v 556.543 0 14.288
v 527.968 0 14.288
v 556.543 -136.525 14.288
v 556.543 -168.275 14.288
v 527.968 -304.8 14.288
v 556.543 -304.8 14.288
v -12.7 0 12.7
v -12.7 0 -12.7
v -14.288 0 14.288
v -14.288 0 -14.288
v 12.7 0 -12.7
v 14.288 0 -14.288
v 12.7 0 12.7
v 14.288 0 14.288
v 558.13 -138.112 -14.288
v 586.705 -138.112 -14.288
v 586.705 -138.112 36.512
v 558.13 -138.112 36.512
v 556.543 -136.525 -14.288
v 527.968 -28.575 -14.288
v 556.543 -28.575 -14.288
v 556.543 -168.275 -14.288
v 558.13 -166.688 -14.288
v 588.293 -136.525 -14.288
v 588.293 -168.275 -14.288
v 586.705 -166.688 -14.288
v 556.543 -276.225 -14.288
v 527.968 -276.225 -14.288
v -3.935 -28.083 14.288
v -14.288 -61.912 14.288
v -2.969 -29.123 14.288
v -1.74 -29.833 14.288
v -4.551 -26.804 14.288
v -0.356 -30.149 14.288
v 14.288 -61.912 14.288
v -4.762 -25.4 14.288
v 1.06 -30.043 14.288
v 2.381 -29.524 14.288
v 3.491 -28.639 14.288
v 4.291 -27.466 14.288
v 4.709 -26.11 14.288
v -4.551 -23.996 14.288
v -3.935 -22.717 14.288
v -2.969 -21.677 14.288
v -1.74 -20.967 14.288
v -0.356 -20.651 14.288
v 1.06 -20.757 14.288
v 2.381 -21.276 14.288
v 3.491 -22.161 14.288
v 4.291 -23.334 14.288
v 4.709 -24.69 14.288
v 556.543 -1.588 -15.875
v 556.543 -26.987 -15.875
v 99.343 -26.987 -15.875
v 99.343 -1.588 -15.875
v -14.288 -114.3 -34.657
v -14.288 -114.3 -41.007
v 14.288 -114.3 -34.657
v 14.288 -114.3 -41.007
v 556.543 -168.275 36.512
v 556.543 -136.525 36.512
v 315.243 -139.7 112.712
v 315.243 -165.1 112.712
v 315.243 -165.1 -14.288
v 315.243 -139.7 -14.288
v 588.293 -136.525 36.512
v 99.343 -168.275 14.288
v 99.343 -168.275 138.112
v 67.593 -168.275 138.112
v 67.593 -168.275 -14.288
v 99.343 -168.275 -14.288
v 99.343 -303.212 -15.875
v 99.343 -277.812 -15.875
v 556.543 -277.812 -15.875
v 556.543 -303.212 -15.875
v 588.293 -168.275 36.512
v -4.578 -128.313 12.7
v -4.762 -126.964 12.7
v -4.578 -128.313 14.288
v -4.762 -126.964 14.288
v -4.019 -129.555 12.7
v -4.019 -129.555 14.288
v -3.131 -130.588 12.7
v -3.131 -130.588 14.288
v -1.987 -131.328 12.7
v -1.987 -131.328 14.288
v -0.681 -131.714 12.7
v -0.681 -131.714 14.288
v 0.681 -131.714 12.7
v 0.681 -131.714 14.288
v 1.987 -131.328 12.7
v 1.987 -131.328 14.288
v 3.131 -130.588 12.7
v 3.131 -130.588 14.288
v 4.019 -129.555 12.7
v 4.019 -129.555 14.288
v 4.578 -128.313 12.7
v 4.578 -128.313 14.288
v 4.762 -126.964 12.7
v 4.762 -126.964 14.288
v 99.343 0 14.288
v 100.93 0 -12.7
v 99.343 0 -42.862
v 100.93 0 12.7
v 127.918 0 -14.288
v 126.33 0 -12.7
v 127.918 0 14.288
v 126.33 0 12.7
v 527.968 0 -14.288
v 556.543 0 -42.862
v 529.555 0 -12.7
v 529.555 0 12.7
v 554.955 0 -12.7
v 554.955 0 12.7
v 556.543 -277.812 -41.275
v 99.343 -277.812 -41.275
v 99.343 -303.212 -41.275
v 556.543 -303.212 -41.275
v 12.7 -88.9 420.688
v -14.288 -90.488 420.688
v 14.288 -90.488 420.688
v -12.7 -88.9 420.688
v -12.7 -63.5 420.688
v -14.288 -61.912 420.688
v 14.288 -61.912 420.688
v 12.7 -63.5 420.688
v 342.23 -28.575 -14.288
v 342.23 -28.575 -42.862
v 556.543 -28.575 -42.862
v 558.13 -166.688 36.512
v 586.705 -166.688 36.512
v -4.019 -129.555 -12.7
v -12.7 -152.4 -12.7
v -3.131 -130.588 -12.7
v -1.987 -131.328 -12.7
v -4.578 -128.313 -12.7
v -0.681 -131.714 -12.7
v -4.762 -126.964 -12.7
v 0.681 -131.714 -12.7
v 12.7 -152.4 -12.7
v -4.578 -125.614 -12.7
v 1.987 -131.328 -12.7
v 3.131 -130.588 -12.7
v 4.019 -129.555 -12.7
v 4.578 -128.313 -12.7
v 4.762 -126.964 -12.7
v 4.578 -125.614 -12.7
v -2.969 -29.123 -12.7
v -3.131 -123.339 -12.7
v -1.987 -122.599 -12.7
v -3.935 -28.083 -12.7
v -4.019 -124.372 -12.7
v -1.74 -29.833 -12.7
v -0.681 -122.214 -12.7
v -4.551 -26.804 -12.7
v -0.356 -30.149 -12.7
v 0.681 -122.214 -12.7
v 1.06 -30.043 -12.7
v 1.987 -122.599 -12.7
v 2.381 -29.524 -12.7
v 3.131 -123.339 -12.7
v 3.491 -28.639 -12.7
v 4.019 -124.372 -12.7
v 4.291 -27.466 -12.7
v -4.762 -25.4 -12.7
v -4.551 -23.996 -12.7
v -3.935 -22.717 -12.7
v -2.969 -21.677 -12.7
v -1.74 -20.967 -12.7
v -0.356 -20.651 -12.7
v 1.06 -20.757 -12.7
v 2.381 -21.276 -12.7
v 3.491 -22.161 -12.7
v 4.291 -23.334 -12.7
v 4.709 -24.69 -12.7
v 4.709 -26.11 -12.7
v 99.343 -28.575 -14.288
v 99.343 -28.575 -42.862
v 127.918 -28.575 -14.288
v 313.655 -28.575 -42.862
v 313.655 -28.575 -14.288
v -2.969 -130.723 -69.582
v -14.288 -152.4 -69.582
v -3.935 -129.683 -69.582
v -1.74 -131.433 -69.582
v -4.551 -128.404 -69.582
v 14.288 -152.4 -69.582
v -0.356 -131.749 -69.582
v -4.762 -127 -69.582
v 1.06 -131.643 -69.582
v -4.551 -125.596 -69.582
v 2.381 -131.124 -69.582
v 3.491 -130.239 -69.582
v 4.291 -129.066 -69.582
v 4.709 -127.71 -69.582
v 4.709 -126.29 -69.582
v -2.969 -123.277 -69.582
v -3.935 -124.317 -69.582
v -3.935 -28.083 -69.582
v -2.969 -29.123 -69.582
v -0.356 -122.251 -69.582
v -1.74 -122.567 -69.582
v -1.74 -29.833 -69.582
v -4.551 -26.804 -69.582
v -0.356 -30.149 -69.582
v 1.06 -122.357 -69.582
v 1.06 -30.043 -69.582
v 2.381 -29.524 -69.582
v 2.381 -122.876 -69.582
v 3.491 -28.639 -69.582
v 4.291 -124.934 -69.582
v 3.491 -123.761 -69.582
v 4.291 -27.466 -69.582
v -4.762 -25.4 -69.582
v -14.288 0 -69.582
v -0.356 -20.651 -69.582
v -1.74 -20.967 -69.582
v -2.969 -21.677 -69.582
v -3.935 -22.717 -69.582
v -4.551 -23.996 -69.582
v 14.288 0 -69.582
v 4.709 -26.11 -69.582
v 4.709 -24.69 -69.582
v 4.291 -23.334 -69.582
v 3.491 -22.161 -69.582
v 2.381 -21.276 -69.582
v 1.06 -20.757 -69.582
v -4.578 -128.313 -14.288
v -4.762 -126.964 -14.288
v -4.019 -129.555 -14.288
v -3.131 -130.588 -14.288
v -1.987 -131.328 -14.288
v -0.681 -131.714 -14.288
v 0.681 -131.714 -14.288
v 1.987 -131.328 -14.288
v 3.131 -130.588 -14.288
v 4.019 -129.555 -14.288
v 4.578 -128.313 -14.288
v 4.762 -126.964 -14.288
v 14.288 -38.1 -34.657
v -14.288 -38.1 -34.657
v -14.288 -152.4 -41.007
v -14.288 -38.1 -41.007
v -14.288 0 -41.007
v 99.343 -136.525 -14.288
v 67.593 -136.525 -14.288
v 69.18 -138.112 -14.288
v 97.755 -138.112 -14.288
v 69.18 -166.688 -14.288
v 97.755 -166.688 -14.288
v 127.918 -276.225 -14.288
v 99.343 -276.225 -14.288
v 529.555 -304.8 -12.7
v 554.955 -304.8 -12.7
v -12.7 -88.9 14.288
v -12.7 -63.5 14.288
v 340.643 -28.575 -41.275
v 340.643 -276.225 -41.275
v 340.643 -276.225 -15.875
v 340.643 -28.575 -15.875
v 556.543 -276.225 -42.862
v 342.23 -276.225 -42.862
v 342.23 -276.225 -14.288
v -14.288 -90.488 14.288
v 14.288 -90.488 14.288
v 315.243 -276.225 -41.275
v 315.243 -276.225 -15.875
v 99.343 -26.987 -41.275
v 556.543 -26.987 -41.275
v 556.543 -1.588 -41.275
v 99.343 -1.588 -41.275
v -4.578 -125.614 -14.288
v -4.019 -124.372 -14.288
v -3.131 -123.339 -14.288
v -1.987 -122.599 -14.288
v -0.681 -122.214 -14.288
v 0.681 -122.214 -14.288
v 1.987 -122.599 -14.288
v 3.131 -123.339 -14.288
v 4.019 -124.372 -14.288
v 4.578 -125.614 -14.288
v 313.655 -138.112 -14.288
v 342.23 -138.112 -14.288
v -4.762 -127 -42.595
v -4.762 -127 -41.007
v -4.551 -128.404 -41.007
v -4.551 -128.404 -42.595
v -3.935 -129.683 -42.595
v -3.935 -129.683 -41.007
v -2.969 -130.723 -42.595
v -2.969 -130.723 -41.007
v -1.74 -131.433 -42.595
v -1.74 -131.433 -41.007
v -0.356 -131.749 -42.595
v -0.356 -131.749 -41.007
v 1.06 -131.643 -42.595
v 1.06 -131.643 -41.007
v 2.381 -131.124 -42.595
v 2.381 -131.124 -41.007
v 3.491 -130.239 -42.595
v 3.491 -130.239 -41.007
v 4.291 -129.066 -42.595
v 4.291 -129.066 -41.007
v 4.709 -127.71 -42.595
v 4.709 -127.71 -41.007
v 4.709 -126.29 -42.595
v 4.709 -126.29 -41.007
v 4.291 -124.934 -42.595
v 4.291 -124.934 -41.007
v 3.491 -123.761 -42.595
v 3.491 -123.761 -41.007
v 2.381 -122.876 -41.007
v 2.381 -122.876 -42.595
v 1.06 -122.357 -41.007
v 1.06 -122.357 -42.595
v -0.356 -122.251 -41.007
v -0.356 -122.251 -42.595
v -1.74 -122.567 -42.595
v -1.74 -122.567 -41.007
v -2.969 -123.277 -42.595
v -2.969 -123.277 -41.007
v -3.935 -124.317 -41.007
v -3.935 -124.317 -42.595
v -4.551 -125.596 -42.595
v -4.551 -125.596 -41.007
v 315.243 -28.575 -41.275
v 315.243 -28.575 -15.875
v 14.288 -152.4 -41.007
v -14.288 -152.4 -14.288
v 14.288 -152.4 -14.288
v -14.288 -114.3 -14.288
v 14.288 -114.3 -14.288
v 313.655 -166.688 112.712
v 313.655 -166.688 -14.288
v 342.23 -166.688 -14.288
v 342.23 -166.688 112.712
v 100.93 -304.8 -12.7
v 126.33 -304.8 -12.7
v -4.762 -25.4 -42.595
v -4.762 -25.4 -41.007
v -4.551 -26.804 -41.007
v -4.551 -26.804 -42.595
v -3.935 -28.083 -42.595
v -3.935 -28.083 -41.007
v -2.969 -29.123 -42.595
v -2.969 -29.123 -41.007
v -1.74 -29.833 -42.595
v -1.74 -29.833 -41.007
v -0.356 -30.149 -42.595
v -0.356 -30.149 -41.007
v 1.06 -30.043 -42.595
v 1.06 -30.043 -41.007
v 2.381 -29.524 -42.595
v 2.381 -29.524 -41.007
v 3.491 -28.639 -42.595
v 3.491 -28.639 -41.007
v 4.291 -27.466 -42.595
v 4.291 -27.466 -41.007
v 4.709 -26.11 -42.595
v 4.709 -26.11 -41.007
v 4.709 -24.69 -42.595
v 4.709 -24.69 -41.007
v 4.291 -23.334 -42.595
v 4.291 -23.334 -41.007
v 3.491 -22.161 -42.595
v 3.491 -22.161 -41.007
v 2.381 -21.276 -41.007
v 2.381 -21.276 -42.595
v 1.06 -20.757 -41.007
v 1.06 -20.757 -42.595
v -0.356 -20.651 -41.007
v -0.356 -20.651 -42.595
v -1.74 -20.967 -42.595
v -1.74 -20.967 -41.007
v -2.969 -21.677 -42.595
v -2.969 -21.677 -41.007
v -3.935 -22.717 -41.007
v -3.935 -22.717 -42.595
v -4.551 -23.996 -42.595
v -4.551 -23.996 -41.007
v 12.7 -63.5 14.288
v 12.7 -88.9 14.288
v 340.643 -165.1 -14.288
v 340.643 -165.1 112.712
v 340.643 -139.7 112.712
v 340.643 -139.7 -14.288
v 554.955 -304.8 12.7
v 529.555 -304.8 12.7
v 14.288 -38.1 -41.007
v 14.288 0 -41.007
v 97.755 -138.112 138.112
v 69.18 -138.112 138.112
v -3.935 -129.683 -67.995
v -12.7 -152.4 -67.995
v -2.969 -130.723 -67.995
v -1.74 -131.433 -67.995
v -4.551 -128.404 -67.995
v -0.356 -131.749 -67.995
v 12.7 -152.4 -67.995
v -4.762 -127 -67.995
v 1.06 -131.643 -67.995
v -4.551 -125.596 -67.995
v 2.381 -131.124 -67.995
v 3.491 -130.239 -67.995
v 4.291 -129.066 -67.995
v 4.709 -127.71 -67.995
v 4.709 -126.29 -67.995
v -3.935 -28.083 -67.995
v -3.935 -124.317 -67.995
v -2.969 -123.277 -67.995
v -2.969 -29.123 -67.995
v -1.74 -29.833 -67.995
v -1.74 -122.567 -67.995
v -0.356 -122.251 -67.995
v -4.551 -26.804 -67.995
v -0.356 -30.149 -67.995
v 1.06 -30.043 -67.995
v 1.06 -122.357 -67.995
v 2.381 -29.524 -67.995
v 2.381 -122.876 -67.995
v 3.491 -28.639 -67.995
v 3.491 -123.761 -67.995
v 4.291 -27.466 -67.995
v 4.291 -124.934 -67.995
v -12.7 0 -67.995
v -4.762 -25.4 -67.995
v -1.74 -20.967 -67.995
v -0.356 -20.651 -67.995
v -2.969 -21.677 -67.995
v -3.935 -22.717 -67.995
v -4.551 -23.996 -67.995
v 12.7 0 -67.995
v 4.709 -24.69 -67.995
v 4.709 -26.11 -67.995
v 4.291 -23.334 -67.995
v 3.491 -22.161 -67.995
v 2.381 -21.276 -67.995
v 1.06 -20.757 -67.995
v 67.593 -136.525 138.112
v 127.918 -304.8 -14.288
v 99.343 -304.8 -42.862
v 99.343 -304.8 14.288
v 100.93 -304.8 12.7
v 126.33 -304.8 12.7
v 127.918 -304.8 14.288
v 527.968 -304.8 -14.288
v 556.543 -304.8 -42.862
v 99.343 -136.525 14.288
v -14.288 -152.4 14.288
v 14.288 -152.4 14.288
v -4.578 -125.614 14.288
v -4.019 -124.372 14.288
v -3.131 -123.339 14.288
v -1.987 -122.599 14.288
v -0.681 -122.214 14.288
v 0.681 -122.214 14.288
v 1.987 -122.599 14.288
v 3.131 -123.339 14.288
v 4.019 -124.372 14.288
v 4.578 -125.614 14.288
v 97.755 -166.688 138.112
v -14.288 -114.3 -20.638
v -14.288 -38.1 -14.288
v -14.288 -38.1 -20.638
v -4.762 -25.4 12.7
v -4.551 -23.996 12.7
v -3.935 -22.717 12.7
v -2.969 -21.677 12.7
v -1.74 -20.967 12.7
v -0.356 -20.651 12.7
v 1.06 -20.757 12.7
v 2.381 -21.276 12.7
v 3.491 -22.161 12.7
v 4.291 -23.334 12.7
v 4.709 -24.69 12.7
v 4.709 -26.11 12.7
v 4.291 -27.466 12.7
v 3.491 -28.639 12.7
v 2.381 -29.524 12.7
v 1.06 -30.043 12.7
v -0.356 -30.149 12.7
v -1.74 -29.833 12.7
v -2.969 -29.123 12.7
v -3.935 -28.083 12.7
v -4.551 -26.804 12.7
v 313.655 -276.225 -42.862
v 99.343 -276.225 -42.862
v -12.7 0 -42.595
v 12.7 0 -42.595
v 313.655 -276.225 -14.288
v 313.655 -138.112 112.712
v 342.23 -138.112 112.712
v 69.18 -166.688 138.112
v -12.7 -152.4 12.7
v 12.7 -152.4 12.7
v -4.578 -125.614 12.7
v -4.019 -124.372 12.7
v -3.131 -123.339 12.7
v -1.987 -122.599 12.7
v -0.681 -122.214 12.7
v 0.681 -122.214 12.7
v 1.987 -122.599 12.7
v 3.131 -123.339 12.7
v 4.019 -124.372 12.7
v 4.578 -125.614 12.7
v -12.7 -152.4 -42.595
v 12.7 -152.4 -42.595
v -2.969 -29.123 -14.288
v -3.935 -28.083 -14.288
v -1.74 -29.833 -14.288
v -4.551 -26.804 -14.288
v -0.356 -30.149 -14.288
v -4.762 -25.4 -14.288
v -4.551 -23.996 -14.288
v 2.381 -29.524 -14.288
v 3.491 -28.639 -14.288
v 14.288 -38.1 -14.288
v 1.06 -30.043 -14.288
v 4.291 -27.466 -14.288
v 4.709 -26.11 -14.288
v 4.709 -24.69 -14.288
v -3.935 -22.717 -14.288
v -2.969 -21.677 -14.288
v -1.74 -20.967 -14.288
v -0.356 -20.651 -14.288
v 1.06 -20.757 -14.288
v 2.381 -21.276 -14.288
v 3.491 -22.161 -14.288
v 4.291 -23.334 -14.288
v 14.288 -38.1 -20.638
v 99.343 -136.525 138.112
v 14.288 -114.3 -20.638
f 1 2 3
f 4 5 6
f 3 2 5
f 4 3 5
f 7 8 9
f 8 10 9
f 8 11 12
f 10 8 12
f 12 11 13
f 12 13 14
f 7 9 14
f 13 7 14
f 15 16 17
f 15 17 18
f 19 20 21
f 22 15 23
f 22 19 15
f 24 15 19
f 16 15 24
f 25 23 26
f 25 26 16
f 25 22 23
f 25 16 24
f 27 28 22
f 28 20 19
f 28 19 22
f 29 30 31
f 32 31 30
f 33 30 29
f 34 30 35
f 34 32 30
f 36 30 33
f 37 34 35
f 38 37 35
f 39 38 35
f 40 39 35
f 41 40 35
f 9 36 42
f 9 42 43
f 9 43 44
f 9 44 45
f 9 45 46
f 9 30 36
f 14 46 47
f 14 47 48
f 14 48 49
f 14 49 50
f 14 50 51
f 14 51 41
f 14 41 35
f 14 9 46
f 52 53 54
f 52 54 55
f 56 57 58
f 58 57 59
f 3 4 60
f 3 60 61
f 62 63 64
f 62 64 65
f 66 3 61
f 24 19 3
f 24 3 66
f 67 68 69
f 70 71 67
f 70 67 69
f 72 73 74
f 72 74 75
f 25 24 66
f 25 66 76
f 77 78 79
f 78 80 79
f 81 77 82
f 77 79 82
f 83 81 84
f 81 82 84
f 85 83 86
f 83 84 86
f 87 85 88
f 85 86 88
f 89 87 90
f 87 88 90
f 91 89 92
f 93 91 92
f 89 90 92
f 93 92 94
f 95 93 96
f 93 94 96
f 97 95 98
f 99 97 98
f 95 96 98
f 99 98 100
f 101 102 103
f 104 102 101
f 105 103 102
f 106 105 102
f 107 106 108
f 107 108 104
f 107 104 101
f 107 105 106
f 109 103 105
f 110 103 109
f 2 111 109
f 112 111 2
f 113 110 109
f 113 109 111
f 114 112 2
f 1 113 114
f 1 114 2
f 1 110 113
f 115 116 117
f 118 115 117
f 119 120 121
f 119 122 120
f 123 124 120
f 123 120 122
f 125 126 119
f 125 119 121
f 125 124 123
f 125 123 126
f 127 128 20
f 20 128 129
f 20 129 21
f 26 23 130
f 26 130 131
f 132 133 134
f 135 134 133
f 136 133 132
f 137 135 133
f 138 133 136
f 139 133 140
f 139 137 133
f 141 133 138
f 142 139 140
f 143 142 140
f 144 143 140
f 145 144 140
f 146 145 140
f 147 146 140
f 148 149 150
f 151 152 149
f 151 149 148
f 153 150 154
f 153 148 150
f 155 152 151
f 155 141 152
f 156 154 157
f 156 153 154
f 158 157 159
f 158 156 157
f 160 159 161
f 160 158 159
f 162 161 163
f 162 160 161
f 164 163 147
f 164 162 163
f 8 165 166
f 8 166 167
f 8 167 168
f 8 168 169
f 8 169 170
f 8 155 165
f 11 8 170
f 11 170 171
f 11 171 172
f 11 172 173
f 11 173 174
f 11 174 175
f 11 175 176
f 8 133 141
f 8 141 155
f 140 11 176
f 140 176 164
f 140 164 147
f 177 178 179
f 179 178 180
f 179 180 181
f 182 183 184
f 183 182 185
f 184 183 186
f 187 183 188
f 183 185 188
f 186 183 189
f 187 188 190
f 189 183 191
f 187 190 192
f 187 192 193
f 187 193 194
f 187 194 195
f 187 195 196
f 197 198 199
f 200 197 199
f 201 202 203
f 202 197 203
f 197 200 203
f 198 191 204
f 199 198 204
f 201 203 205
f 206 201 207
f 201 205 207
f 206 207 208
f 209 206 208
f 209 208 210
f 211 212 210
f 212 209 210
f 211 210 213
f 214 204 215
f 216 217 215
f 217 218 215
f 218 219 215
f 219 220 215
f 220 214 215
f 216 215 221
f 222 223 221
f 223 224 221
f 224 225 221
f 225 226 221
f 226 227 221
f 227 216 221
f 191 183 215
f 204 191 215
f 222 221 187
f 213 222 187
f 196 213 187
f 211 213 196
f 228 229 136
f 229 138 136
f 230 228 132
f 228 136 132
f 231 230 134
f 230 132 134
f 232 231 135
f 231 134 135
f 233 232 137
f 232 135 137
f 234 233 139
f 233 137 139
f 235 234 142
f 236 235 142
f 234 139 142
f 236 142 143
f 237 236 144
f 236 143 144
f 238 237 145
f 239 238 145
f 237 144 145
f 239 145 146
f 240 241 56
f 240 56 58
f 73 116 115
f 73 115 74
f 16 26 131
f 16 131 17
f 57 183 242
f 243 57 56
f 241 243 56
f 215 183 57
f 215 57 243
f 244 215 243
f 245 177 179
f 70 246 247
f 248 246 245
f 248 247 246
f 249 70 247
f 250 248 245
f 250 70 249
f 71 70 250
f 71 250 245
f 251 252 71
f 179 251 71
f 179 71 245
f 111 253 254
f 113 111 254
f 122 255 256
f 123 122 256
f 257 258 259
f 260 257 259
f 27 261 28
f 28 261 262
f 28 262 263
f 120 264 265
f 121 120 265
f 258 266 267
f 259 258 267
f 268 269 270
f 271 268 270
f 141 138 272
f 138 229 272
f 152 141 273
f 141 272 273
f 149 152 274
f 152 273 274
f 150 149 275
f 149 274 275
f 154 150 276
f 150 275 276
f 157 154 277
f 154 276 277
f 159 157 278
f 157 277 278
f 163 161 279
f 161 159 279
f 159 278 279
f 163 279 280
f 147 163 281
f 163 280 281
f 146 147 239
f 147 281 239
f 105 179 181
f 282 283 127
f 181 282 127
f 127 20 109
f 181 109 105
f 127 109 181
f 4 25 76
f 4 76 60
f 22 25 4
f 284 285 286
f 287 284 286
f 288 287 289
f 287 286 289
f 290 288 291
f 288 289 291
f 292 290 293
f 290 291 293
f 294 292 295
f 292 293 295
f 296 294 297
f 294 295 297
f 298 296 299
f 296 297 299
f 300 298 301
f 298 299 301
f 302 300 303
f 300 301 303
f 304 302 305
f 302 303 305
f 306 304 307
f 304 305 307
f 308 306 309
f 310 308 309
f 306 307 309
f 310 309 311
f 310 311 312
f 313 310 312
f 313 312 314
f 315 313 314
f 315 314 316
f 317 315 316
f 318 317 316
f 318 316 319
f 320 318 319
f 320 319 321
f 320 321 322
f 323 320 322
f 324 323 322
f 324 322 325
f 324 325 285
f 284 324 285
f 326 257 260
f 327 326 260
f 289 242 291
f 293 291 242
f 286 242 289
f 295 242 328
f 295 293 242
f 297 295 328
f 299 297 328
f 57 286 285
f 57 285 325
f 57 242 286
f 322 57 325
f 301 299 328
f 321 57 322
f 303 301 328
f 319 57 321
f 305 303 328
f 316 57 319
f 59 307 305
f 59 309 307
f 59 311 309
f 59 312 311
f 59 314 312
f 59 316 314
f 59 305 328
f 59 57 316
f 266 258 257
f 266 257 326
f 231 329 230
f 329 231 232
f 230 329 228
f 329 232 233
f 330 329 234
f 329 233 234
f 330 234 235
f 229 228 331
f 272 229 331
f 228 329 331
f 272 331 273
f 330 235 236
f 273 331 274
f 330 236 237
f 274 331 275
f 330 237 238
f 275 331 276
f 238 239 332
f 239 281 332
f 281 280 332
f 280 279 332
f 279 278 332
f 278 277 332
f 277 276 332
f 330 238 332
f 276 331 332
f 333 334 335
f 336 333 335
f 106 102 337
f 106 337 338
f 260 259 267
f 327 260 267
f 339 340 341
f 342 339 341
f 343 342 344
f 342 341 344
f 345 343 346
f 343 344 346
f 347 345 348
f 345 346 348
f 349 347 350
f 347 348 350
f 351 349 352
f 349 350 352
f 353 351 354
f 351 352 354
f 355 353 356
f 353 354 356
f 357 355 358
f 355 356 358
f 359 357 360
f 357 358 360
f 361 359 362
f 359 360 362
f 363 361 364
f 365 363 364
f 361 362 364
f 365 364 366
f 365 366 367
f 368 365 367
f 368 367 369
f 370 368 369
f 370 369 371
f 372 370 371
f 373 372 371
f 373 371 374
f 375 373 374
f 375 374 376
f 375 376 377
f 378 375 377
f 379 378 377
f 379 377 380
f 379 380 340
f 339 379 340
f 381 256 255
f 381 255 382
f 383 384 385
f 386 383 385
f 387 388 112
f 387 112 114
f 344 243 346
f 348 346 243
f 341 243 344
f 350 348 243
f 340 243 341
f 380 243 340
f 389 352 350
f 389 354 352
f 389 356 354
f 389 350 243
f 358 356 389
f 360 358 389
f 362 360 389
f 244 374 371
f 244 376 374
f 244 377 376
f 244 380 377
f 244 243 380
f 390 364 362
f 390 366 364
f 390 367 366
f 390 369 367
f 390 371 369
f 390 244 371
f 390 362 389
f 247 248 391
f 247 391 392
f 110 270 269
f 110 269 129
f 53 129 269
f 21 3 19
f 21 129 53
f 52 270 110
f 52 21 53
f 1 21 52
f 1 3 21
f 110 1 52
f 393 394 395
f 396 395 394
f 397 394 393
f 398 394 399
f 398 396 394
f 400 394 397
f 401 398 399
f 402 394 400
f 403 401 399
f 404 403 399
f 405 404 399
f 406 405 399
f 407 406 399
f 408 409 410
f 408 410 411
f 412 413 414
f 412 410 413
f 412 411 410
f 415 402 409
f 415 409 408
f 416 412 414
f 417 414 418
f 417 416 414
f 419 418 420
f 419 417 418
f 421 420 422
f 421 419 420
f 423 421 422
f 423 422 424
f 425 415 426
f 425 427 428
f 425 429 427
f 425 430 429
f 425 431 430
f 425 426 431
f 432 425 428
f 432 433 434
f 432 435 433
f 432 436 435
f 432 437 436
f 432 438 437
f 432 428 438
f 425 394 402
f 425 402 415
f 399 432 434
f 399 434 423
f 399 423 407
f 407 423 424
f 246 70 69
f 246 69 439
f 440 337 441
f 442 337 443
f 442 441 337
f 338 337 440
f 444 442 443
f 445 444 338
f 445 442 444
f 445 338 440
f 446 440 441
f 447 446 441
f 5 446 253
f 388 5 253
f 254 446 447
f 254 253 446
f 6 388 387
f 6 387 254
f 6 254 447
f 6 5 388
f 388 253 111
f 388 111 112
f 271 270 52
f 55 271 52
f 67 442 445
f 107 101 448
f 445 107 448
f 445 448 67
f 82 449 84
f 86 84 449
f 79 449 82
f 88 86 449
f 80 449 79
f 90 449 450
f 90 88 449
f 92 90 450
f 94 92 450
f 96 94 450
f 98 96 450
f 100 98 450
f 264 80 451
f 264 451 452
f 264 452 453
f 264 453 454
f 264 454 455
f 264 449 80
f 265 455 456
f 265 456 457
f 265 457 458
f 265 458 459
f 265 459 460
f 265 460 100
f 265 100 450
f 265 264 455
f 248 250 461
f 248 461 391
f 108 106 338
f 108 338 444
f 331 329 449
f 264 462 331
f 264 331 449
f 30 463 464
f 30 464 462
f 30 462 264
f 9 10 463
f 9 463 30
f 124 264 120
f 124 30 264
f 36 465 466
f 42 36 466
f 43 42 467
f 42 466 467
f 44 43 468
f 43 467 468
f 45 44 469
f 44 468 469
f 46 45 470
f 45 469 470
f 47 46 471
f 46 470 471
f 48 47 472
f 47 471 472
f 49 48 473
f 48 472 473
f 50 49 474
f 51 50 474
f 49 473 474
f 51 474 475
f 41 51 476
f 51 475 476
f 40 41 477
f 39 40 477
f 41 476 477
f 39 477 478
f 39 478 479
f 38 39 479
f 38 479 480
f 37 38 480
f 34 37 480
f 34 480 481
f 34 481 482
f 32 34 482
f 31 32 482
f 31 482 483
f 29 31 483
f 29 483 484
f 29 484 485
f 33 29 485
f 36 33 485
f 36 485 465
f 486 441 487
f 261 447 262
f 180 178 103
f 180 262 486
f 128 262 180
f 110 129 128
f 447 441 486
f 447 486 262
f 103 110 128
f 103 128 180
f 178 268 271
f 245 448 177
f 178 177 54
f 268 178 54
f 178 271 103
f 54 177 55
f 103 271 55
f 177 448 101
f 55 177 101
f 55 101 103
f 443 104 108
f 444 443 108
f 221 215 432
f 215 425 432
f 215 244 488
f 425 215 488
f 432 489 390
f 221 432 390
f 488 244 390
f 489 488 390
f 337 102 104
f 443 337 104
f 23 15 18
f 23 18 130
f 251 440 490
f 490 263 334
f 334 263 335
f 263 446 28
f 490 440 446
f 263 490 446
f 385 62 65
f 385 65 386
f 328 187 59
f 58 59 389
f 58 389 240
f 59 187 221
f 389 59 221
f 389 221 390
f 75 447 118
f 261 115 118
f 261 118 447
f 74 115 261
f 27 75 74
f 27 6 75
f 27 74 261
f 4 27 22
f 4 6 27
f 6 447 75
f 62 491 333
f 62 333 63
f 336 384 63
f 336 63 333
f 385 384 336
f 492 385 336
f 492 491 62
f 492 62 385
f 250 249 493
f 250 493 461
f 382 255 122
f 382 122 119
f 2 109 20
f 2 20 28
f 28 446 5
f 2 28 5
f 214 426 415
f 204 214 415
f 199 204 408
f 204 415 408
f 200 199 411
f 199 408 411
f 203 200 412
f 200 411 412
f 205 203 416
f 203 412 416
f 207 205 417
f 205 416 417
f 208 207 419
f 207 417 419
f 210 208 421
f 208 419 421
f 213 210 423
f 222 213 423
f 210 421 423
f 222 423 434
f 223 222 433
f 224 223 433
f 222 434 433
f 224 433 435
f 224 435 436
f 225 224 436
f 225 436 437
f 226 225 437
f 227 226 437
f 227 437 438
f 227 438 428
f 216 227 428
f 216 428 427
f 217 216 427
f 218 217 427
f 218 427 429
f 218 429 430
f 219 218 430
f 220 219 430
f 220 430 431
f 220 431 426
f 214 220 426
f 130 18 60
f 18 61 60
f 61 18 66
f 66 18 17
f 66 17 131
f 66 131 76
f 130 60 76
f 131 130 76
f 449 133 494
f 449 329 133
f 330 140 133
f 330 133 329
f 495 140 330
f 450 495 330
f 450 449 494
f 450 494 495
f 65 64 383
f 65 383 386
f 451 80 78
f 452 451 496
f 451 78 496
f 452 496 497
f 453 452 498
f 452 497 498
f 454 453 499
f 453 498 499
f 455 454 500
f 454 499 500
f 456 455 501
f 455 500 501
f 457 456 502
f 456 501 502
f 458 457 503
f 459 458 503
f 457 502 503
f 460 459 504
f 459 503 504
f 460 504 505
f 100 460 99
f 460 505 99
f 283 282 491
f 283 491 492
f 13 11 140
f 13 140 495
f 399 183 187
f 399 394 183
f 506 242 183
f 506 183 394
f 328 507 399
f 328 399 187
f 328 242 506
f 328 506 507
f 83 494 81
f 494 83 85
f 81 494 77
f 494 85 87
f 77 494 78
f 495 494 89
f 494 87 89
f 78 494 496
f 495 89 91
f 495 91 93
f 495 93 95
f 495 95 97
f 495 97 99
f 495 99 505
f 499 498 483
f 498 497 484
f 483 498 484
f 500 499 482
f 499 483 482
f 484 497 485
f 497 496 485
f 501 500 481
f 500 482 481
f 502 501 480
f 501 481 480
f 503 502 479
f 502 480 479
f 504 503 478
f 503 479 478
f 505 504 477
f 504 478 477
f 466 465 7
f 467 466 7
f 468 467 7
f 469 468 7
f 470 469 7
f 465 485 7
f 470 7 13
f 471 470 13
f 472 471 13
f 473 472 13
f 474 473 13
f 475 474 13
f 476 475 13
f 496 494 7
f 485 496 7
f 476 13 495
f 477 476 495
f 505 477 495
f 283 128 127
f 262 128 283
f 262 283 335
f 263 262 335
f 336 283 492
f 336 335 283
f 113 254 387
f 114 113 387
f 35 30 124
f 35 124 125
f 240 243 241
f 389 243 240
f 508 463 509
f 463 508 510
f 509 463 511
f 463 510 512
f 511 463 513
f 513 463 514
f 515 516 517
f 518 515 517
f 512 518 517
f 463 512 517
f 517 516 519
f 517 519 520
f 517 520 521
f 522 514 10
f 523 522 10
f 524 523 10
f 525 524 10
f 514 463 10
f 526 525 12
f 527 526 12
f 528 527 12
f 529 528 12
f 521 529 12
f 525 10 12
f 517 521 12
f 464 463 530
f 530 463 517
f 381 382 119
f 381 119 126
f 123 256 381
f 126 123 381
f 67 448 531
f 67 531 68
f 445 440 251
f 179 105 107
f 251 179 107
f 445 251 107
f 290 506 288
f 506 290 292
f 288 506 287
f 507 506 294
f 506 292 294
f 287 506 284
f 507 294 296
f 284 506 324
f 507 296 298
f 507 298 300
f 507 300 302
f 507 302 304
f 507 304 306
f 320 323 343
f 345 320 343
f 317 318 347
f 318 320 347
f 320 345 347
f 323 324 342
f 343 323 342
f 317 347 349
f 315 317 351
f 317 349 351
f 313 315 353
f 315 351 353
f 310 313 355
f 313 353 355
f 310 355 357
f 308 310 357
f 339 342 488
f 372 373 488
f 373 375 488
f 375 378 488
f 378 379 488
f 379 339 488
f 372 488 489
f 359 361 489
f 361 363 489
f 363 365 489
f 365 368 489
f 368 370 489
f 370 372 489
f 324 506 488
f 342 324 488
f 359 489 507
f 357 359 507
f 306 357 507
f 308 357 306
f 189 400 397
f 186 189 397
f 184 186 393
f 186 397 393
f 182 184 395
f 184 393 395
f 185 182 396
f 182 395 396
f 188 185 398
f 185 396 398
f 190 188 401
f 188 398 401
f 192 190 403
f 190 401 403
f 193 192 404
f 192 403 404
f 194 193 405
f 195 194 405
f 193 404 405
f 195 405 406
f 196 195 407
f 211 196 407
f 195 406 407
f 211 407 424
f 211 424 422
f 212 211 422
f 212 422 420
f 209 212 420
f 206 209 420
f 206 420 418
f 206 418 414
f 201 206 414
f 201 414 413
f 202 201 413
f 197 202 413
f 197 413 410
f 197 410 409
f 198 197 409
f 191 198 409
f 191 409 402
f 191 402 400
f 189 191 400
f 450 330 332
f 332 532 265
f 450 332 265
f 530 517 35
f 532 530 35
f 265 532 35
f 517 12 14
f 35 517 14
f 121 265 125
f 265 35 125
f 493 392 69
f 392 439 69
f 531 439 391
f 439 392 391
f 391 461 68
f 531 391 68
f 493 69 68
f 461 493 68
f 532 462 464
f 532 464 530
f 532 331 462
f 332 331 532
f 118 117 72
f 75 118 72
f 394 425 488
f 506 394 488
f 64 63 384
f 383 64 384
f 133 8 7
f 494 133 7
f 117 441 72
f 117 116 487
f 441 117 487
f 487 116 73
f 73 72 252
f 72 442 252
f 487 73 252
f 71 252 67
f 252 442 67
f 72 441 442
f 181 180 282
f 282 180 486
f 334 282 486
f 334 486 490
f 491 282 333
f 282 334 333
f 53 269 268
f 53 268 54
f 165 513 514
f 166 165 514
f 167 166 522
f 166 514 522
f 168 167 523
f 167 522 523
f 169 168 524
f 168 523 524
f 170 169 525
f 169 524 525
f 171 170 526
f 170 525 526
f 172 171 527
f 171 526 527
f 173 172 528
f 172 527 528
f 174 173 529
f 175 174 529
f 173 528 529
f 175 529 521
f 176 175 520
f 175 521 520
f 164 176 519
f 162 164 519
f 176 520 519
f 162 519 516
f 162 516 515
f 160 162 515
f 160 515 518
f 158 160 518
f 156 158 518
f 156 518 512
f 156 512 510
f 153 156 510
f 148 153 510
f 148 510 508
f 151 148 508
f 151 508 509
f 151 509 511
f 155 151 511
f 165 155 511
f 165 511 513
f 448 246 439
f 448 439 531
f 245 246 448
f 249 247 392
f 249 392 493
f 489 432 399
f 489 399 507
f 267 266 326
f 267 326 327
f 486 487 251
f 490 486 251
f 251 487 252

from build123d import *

# Parameters (mm, degrees)
F0_W      = 28.575
F0_H      = 28.575
F0_W_2    = 25.4
F0_H_2    = 25.4
F1_DEPTH  = 152.4
F2_W      = 28.575
F2_H      = 28.575
F2_W_2    = 25.4
F2_H_2    = 25.4
F3_DEPTH  = 406.4
F4_W      = 28.575
F4_H      = 76.2
F5_DEPTH  = 6.35
F7_D      = 9.525
F8_W      = 28.575
F8_H      = 28.575
F8_W_2    = 25.4
F8_H_2    = 25.4
F9_DEPTH  = 152.4
F10_W     = 28.575
F10_H     = 76.2
F11_DEPTH = 6.35
F13_D     = 9.525
F13_2_D   = 9.525
F14_W     = 28.575
F14_H     = 28.575
F14_W_2   = 25.4
F14_H_2   = 25.4
F15_DEPTH = 304.8
F16_W     = 28.575
F16_H     = 28.575
F16_W_2   = 25.4
F16_H_2   = 25.4
F17_DEPTH = 457.2
F18_W     = 28.575
F18_H     = 28.575
F18_W_2   = 25.4
F18_H_2   = 25.4
F19_DEPTH = 304.8
F20_W     = 28.575
F20_H     = 28.575
F20_W_2   = 25.4
F20_H_2   = 25.4
F21_DEPTH = 247.65
F22_W     = 28.575
F22_H     = 28.575
F22_W_2   = 25.4
F22_H_2   = 25.4
F23_DEPTH = 457.2
F24_W     = 28.575
F24_H     = 28.575
F24_W_2   = 25.4
F24_H_2   = 25.4
F25_DEPTH = 127
F27_DEPTH = 152.4
F29_DEPTH = 50.8


with BuildPart() as f1:
    # F0 (on Front) → F1 (new body)
    with BuildSketch(Plane.XZ):
        Rectangle(F0_W, F0_H)
        Rectangle(F0_W_2, F0_H_2, mode=Mode.SUBTRACT)
    extrude(amount=F1_DEPTH)

    # F2 (on face) → F3 (join)
    with BuildSketch(Plane.XY.offset(14.2875)):
        with Locations((0, -76.2)):
            Rectangle(F2_W, F2_H)
        with Locations((0, -76.2)):
            Rectangle(F2_W_2, F2_H_2, mode=Mode.SUBTRACT)
    extrude(amount=F3_DEPTH)

    # F4 (on face) → F5 (join)
    with BuildSketch(Plane(origin=(0, 0, -14.2875), x_dir=(1, 0, 0), z_dir=(0, 0, -1))):
        with Locations((0, 76.2)):
            Rectangle(F4_W, F4_H)
    extrude(amount=F5_DEPTH)

    # F7 (through all)
    with Locations(Plane.XY.offset(14.2875)):
        with Locations((0, -25.4), (0, -126.9274034262)):
            Hole(F7_D / 2)

    # F13 (through all)
    with Locations(Plane(origin=(0, 0, -69.5821813405), x_dir=(1, 0, 0), z_dir=(0, 0, -1))):
        with Locations((0, 127), (0, 25.4)):
            Hole(F13_D / 2)


with BuildPart() as f9:
    # F8 (on Front) → F9 (new body)
    with BuildSketch(Plane.XZ):
        with Locations((0, -55.2946813405)):
            Rectangle(F8_W, F8_H)
        with Locations((0, -55.2946813405)):
            Rectangle(F8_W_2, F8_H_2, mode=Mode.SUBTRACT)
    extrude(amount=F9_DEPTH)

    # F10 (on face) → F11 (join)
    with BuildSketch(Plane.XY.offset(-41.0071813405)):
        with Locations((0, -76.2)):
            Rectangle(F10_W, F10_H)
    extrude(amount=F11_DEPTH)

    # F13#2 (through all)
    with Locations(Plane(origin=(0, 0, -69.5821813405), x_dir=(1, 0, 0), z_dir=(0, 0, -1))):
        with Locations((0, 127), (0, 25.4)):
            Hole(F13_2_D / 2)


with BuildPart() as f15:
    # F14 (on Front) → F15 (new body)
    with BuildSketch(Plane.XZ):
        with Locations((113.6303395033, 0)):
            Rectangle(F14_W, F14_H)
        with Locations((113.6303395033, 0)):
            Rectangle(F14_W_2, F14_H_2, mode=Mode.SUBTRACT)
    extrude(amount=F15_DEPTH)

    # F16 (on face) → F17 (join)
    with BuildSketch(Plane(origin=(99.3428395033, 0, 0), x_dir=(0, -1, 0), z_dir=(-1, 0, 0))):
        with Locations((290.5125, -28.575)):
            Rectangle(F16_W, F16_H)
        with Locations((290.5125, -28.575)):
            Rectangle(F16_W_2, F16_H_2, mode=Mode.SUBTRACT)
    extrude(amount=-F17_DEPTH)

    # F18 (on face) → F19 (join)
    with BuildSketch(Plane.XZ.offset(304.8)):
        with Locations((542.2553395033, 0)):
            Rectangle(F18_W, F18_H)
        with Locations((542.2553395033, 0)):
            Rectangle(F18_W_2, F18_H_2, mode=Mode.SUBTRACT)
    extrude(amount=-F19_DEPTH)

    # F20 (on face) → F21 (join)
    with BuildSketch(Plane(origin=(0, -276.225, 0), x_dir=(-1, 0, 0), z_dir=(0, 1, 0))):
        with Locations((-327.9428395033, -28.575)):
            Rectangle(F20_W, F20_H)
        with Locations((-327.9428395033, -28.575)):
            Rectangle(F20_W_2, F20_H_2, mode=Mode.SUBTRACT)
    extrude(amount=F21_DEPTH)

    # F22 (on face) → F23 (join)
    with BuildSketch(Plane.YZ.offset(556.5428395033)):
        with Locations((-14.2875, -28.575)):
            Rectangle(F22_W, F22_H)
        with Locations((-14.2875, -28.575)):
            Rectangle(F22_W_2, F22_H_2, mode=Mode.SUBTRACT)
    extrude(amount=-F23_DEPTH)

    # F24 (on face) → F25 (join)
    with BuildSketch(Plane.XY.offset(-14.2875)):
        with Locations((327.9428395033, -152.4)):
            Rectangle(F24_W, F24_H)
        with Locations((327.9428395033, -152.4)):
            Rectangle(F24_W_2, F24_H_2, mode=Mode.SUBTRACT)
    extrude(amount=F25_DEPTH)

    # F26 (on face) → F27 (join)
    with BuildSketch(Plane(origin=(0, 0, -14.2875), x_dir=(1, 0, 0), z_dir=(0, 0, -1))):
        Polygon((99.3428395033, 136.525), (99.3428395033, 152.4), (99.3428395033, 168.275), (67.5928395033, 168.275), (67.5928395033, 136.525), align=None)
        Polygon((97.7553395033, 166.6875), (97.7553395033, 152.4), (97.7553395033, 138.1125), (69.1803395033, 138.1125), (69.1803395033, 166.6875), align=None, mode=Mode.SUBTRACT)
    extrude(amount=-F27_DEPTH)

    # F28 (on face) → F29 (join)
    with BuildSketch(Plane(origin=(0, 0, -14.2875), x_dir=(1, 0, 0), z_dir=(0, 0, -1))):
        Polygon((556.5428395033, 168.275), (556.5428395033, 152.4), (556.5428395033, 136.525), (588.2928395033, 136.525), (588.2928395033, 168.275), align=None)
        Polygon((558.1303395033, 138.1125), (558.1303395033, 152.4), (558.1303395033, 166.6875), (586.7053395033, 166.6875), (586.7053395033, 138.1125), align=None, mode=Mode.SUBTRACT)
    extrude(amount=-F29_DEPTH)


solid = Compound([f1.part, f9.part, f15.part])
